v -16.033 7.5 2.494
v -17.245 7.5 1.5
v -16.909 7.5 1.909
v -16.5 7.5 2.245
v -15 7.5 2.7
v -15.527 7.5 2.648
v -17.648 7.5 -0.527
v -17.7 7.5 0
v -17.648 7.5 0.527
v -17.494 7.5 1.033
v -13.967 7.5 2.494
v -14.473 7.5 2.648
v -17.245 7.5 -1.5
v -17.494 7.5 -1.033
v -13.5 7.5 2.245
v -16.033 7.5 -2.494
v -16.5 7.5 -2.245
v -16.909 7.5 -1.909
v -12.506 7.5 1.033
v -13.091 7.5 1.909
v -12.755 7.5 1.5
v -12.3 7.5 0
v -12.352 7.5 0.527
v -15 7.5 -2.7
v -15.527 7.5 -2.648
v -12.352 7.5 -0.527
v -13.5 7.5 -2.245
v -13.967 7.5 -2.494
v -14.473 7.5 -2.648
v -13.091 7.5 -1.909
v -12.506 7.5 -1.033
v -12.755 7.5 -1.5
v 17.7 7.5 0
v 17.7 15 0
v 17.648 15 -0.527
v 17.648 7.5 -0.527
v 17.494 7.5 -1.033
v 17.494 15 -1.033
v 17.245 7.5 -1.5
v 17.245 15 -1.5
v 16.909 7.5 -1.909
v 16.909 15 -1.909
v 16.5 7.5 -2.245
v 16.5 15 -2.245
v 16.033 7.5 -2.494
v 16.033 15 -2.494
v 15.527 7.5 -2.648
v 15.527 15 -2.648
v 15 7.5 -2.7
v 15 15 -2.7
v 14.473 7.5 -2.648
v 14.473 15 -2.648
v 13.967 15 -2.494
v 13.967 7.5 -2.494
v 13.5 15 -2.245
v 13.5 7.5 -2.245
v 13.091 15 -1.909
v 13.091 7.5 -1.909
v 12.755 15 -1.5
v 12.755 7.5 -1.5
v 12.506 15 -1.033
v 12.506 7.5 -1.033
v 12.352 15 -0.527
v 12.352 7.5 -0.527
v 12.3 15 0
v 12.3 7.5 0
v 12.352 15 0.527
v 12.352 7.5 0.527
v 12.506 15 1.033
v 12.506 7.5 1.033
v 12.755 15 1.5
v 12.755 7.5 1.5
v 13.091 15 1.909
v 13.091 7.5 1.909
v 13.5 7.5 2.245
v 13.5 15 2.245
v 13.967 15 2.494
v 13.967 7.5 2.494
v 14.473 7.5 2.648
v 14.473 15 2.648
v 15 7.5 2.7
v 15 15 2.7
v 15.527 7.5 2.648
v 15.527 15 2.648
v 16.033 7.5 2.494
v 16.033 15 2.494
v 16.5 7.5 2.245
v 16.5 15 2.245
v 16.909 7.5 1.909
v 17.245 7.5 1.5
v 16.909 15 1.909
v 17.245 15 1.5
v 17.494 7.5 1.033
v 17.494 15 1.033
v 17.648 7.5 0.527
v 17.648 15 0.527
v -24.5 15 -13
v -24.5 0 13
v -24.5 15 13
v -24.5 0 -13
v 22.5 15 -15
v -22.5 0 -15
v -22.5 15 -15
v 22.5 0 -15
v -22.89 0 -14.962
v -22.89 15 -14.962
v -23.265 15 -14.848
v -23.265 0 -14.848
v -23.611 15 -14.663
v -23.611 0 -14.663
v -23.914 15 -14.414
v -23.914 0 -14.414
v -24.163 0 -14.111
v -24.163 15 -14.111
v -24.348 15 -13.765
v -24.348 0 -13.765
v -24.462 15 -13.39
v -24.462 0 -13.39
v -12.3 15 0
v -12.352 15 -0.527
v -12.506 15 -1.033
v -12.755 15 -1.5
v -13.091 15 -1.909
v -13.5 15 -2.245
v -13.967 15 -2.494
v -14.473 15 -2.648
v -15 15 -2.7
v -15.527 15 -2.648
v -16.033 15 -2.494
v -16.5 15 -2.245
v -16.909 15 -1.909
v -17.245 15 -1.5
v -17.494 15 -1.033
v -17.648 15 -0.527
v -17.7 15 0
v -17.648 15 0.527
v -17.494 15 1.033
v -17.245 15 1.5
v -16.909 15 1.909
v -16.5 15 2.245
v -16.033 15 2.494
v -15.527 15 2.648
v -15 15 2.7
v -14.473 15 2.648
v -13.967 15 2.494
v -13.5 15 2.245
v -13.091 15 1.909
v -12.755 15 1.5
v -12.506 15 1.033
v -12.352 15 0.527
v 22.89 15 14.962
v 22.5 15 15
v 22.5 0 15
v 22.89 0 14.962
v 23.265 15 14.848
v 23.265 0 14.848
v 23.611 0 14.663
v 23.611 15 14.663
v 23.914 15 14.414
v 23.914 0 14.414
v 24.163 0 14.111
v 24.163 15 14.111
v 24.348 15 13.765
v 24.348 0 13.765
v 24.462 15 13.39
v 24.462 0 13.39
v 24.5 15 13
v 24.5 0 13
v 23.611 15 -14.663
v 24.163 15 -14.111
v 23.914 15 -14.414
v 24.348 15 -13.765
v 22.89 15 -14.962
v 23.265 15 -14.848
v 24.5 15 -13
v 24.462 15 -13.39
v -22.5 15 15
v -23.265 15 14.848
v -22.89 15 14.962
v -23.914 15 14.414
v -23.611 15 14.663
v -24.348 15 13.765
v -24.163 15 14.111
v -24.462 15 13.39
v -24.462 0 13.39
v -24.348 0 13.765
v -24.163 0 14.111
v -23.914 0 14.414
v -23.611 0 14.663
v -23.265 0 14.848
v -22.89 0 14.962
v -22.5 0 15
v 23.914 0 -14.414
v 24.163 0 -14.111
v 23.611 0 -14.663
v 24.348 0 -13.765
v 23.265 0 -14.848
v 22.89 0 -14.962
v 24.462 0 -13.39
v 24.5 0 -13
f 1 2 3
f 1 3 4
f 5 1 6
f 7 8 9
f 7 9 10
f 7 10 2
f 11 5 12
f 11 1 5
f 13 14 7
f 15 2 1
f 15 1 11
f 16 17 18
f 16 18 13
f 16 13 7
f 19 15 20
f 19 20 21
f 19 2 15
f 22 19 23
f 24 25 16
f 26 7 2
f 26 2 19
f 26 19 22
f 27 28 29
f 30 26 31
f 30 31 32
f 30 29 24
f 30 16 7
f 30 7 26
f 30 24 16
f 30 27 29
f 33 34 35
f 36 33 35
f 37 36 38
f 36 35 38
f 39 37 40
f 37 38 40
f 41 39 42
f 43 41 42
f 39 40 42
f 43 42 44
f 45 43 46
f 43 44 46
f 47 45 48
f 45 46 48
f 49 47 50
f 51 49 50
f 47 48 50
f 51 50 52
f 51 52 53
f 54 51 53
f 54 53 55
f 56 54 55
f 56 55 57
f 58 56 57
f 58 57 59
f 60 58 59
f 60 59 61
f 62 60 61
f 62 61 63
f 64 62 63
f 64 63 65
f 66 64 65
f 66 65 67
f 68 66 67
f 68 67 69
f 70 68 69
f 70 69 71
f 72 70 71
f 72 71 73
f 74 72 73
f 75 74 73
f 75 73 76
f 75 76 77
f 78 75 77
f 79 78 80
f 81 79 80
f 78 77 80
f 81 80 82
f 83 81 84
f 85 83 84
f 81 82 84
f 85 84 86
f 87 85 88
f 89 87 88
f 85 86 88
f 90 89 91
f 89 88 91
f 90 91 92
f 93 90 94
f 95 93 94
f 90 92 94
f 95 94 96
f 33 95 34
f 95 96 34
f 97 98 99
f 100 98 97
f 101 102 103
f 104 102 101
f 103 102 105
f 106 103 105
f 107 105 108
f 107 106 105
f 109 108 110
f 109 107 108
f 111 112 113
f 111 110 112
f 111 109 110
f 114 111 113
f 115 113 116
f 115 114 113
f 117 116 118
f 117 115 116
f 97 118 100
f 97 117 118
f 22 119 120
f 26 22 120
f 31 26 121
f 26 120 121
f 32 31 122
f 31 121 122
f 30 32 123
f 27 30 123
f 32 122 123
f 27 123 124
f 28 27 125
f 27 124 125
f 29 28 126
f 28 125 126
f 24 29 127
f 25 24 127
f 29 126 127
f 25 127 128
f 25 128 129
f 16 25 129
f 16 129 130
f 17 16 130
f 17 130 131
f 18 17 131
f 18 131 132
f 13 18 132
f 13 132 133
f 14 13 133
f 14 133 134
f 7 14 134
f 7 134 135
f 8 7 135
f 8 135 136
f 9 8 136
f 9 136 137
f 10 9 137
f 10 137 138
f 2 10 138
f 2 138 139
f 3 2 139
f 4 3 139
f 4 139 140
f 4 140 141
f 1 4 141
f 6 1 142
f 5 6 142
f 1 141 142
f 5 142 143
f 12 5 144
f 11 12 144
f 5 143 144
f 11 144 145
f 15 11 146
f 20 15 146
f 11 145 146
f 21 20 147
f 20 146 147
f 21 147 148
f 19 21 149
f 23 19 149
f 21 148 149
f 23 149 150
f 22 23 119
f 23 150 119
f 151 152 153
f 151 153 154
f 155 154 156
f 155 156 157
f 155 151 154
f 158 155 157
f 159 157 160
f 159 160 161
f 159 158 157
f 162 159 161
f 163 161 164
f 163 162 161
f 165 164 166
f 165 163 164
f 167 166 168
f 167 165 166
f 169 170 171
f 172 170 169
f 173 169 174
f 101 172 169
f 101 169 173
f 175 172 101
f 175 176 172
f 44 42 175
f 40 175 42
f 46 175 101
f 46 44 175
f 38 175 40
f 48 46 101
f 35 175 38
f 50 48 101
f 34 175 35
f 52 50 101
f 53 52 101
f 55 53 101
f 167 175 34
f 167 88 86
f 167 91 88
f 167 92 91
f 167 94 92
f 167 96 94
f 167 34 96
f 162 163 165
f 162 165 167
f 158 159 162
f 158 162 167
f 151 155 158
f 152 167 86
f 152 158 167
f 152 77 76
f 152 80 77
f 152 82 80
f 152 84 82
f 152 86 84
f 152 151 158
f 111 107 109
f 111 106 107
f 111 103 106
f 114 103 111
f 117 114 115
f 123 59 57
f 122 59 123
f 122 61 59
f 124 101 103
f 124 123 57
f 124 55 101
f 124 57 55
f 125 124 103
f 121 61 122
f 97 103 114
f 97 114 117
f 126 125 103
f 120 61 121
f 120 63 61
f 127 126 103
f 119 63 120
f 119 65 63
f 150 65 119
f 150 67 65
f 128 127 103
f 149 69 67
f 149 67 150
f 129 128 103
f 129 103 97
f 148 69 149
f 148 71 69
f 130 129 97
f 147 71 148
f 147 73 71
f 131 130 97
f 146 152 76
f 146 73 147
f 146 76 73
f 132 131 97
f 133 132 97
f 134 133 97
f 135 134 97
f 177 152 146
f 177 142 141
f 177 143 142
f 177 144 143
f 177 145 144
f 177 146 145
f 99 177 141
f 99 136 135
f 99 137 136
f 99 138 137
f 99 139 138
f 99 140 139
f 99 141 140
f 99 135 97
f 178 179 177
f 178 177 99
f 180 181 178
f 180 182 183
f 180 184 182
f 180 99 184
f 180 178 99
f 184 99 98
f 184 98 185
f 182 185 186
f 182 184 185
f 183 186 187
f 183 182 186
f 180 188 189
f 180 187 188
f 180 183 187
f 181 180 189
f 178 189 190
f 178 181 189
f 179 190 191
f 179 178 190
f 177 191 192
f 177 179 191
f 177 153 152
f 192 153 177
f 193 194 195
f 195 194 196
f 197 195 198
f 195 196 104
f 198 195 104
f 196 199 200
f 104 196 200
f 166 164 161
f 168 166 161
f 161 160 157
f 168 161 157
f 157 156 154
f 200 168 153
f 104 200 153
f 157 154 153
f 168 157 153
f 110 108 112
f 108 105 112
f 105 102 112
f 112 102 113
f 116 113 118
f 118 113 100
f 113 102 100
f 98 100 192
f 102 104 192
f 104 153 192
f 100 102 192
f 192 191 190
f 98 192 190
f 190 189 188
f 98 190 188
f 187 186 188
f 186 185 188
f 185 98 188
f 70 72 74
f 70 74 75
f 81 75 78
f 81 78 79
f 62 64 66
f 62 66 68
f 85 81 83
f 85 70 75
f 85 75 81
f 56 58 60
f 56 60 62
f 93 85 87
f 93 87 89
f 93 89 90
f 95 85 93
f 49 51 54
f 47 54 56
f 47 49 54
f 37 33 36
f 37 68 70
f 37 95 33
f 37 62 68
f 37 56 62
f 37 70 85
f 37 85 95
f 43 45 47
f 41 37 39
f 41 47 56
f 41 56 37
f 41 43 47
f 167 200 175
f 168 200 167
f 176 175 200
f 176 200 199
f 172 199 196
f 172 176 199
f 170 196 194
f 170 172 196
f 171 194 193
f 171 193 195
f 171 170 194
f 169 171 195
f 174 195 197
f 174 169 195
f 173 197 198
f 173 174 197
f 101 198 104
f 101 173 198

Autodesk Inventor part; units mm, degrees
ref_plane "YZ Plane" through (0, 0, 0) normal (1, 0, 0) x (0, 1, 0)
ref_plane "XZ Plane" through (0, 0, 0) normal (0, 1, 0) x (-1, 0, 0)
ref_plane "XY Plane" through (0, 0, 0) normal (0, 0, 1) x (1, 0, 0)
sketch "Boceto1" plane through (0, 0, 0) normal (0, 1, 0) x (-1, 0, 0)
  line L0 (-24.5, 15) -> (24.5, 15)
  line L1 (24.5, 15) -> (24.5, -15)
  line L2 (24.5, -15) -> (-24.5, -15)
  line L3 (-24.5, -15) -> (-24.5, 15)
  line L4 (-24.5, 15) -> (24.5, -15) construction
  line L5 (24.5, 15) -> (-24.5, -15) construction
  point P0 (0, 0)
  dimension "d0" = 49
  dimension "d1" = 30
extrude "Extrusión1" add sketch "Boceto1" along normal blind 15
sketch "Boceto2" plane through (0, 15, 0) normal (0, 1, 0) x (1, 0, 0)
  circle A0 centre (-15, 0) radius 2.7
  circle A1 centre (15, 0) radius 2.7
  line L0 (-24.5, 15) -> (-24.5, -15) projected
  line L1 (24.5, -15) -> (24.5, 15) projected
  point P0 (0, 0)
  dimension "d4" = 5.4
  dimension "d5" = 5.4
  dimension "d10" = 15
  dimension "d11" = 15
extrude "Extrusión2" cut sketch "Boceto2" against normal blind 7.5
fillet "Empalme1" radius 2 4 edges at (-24.5, 7.5, 15) (24.5, 7.5, 15) (24.5, 7.5, -15) (-24.5, 7.5, -15)
properties part number "Teeth"
